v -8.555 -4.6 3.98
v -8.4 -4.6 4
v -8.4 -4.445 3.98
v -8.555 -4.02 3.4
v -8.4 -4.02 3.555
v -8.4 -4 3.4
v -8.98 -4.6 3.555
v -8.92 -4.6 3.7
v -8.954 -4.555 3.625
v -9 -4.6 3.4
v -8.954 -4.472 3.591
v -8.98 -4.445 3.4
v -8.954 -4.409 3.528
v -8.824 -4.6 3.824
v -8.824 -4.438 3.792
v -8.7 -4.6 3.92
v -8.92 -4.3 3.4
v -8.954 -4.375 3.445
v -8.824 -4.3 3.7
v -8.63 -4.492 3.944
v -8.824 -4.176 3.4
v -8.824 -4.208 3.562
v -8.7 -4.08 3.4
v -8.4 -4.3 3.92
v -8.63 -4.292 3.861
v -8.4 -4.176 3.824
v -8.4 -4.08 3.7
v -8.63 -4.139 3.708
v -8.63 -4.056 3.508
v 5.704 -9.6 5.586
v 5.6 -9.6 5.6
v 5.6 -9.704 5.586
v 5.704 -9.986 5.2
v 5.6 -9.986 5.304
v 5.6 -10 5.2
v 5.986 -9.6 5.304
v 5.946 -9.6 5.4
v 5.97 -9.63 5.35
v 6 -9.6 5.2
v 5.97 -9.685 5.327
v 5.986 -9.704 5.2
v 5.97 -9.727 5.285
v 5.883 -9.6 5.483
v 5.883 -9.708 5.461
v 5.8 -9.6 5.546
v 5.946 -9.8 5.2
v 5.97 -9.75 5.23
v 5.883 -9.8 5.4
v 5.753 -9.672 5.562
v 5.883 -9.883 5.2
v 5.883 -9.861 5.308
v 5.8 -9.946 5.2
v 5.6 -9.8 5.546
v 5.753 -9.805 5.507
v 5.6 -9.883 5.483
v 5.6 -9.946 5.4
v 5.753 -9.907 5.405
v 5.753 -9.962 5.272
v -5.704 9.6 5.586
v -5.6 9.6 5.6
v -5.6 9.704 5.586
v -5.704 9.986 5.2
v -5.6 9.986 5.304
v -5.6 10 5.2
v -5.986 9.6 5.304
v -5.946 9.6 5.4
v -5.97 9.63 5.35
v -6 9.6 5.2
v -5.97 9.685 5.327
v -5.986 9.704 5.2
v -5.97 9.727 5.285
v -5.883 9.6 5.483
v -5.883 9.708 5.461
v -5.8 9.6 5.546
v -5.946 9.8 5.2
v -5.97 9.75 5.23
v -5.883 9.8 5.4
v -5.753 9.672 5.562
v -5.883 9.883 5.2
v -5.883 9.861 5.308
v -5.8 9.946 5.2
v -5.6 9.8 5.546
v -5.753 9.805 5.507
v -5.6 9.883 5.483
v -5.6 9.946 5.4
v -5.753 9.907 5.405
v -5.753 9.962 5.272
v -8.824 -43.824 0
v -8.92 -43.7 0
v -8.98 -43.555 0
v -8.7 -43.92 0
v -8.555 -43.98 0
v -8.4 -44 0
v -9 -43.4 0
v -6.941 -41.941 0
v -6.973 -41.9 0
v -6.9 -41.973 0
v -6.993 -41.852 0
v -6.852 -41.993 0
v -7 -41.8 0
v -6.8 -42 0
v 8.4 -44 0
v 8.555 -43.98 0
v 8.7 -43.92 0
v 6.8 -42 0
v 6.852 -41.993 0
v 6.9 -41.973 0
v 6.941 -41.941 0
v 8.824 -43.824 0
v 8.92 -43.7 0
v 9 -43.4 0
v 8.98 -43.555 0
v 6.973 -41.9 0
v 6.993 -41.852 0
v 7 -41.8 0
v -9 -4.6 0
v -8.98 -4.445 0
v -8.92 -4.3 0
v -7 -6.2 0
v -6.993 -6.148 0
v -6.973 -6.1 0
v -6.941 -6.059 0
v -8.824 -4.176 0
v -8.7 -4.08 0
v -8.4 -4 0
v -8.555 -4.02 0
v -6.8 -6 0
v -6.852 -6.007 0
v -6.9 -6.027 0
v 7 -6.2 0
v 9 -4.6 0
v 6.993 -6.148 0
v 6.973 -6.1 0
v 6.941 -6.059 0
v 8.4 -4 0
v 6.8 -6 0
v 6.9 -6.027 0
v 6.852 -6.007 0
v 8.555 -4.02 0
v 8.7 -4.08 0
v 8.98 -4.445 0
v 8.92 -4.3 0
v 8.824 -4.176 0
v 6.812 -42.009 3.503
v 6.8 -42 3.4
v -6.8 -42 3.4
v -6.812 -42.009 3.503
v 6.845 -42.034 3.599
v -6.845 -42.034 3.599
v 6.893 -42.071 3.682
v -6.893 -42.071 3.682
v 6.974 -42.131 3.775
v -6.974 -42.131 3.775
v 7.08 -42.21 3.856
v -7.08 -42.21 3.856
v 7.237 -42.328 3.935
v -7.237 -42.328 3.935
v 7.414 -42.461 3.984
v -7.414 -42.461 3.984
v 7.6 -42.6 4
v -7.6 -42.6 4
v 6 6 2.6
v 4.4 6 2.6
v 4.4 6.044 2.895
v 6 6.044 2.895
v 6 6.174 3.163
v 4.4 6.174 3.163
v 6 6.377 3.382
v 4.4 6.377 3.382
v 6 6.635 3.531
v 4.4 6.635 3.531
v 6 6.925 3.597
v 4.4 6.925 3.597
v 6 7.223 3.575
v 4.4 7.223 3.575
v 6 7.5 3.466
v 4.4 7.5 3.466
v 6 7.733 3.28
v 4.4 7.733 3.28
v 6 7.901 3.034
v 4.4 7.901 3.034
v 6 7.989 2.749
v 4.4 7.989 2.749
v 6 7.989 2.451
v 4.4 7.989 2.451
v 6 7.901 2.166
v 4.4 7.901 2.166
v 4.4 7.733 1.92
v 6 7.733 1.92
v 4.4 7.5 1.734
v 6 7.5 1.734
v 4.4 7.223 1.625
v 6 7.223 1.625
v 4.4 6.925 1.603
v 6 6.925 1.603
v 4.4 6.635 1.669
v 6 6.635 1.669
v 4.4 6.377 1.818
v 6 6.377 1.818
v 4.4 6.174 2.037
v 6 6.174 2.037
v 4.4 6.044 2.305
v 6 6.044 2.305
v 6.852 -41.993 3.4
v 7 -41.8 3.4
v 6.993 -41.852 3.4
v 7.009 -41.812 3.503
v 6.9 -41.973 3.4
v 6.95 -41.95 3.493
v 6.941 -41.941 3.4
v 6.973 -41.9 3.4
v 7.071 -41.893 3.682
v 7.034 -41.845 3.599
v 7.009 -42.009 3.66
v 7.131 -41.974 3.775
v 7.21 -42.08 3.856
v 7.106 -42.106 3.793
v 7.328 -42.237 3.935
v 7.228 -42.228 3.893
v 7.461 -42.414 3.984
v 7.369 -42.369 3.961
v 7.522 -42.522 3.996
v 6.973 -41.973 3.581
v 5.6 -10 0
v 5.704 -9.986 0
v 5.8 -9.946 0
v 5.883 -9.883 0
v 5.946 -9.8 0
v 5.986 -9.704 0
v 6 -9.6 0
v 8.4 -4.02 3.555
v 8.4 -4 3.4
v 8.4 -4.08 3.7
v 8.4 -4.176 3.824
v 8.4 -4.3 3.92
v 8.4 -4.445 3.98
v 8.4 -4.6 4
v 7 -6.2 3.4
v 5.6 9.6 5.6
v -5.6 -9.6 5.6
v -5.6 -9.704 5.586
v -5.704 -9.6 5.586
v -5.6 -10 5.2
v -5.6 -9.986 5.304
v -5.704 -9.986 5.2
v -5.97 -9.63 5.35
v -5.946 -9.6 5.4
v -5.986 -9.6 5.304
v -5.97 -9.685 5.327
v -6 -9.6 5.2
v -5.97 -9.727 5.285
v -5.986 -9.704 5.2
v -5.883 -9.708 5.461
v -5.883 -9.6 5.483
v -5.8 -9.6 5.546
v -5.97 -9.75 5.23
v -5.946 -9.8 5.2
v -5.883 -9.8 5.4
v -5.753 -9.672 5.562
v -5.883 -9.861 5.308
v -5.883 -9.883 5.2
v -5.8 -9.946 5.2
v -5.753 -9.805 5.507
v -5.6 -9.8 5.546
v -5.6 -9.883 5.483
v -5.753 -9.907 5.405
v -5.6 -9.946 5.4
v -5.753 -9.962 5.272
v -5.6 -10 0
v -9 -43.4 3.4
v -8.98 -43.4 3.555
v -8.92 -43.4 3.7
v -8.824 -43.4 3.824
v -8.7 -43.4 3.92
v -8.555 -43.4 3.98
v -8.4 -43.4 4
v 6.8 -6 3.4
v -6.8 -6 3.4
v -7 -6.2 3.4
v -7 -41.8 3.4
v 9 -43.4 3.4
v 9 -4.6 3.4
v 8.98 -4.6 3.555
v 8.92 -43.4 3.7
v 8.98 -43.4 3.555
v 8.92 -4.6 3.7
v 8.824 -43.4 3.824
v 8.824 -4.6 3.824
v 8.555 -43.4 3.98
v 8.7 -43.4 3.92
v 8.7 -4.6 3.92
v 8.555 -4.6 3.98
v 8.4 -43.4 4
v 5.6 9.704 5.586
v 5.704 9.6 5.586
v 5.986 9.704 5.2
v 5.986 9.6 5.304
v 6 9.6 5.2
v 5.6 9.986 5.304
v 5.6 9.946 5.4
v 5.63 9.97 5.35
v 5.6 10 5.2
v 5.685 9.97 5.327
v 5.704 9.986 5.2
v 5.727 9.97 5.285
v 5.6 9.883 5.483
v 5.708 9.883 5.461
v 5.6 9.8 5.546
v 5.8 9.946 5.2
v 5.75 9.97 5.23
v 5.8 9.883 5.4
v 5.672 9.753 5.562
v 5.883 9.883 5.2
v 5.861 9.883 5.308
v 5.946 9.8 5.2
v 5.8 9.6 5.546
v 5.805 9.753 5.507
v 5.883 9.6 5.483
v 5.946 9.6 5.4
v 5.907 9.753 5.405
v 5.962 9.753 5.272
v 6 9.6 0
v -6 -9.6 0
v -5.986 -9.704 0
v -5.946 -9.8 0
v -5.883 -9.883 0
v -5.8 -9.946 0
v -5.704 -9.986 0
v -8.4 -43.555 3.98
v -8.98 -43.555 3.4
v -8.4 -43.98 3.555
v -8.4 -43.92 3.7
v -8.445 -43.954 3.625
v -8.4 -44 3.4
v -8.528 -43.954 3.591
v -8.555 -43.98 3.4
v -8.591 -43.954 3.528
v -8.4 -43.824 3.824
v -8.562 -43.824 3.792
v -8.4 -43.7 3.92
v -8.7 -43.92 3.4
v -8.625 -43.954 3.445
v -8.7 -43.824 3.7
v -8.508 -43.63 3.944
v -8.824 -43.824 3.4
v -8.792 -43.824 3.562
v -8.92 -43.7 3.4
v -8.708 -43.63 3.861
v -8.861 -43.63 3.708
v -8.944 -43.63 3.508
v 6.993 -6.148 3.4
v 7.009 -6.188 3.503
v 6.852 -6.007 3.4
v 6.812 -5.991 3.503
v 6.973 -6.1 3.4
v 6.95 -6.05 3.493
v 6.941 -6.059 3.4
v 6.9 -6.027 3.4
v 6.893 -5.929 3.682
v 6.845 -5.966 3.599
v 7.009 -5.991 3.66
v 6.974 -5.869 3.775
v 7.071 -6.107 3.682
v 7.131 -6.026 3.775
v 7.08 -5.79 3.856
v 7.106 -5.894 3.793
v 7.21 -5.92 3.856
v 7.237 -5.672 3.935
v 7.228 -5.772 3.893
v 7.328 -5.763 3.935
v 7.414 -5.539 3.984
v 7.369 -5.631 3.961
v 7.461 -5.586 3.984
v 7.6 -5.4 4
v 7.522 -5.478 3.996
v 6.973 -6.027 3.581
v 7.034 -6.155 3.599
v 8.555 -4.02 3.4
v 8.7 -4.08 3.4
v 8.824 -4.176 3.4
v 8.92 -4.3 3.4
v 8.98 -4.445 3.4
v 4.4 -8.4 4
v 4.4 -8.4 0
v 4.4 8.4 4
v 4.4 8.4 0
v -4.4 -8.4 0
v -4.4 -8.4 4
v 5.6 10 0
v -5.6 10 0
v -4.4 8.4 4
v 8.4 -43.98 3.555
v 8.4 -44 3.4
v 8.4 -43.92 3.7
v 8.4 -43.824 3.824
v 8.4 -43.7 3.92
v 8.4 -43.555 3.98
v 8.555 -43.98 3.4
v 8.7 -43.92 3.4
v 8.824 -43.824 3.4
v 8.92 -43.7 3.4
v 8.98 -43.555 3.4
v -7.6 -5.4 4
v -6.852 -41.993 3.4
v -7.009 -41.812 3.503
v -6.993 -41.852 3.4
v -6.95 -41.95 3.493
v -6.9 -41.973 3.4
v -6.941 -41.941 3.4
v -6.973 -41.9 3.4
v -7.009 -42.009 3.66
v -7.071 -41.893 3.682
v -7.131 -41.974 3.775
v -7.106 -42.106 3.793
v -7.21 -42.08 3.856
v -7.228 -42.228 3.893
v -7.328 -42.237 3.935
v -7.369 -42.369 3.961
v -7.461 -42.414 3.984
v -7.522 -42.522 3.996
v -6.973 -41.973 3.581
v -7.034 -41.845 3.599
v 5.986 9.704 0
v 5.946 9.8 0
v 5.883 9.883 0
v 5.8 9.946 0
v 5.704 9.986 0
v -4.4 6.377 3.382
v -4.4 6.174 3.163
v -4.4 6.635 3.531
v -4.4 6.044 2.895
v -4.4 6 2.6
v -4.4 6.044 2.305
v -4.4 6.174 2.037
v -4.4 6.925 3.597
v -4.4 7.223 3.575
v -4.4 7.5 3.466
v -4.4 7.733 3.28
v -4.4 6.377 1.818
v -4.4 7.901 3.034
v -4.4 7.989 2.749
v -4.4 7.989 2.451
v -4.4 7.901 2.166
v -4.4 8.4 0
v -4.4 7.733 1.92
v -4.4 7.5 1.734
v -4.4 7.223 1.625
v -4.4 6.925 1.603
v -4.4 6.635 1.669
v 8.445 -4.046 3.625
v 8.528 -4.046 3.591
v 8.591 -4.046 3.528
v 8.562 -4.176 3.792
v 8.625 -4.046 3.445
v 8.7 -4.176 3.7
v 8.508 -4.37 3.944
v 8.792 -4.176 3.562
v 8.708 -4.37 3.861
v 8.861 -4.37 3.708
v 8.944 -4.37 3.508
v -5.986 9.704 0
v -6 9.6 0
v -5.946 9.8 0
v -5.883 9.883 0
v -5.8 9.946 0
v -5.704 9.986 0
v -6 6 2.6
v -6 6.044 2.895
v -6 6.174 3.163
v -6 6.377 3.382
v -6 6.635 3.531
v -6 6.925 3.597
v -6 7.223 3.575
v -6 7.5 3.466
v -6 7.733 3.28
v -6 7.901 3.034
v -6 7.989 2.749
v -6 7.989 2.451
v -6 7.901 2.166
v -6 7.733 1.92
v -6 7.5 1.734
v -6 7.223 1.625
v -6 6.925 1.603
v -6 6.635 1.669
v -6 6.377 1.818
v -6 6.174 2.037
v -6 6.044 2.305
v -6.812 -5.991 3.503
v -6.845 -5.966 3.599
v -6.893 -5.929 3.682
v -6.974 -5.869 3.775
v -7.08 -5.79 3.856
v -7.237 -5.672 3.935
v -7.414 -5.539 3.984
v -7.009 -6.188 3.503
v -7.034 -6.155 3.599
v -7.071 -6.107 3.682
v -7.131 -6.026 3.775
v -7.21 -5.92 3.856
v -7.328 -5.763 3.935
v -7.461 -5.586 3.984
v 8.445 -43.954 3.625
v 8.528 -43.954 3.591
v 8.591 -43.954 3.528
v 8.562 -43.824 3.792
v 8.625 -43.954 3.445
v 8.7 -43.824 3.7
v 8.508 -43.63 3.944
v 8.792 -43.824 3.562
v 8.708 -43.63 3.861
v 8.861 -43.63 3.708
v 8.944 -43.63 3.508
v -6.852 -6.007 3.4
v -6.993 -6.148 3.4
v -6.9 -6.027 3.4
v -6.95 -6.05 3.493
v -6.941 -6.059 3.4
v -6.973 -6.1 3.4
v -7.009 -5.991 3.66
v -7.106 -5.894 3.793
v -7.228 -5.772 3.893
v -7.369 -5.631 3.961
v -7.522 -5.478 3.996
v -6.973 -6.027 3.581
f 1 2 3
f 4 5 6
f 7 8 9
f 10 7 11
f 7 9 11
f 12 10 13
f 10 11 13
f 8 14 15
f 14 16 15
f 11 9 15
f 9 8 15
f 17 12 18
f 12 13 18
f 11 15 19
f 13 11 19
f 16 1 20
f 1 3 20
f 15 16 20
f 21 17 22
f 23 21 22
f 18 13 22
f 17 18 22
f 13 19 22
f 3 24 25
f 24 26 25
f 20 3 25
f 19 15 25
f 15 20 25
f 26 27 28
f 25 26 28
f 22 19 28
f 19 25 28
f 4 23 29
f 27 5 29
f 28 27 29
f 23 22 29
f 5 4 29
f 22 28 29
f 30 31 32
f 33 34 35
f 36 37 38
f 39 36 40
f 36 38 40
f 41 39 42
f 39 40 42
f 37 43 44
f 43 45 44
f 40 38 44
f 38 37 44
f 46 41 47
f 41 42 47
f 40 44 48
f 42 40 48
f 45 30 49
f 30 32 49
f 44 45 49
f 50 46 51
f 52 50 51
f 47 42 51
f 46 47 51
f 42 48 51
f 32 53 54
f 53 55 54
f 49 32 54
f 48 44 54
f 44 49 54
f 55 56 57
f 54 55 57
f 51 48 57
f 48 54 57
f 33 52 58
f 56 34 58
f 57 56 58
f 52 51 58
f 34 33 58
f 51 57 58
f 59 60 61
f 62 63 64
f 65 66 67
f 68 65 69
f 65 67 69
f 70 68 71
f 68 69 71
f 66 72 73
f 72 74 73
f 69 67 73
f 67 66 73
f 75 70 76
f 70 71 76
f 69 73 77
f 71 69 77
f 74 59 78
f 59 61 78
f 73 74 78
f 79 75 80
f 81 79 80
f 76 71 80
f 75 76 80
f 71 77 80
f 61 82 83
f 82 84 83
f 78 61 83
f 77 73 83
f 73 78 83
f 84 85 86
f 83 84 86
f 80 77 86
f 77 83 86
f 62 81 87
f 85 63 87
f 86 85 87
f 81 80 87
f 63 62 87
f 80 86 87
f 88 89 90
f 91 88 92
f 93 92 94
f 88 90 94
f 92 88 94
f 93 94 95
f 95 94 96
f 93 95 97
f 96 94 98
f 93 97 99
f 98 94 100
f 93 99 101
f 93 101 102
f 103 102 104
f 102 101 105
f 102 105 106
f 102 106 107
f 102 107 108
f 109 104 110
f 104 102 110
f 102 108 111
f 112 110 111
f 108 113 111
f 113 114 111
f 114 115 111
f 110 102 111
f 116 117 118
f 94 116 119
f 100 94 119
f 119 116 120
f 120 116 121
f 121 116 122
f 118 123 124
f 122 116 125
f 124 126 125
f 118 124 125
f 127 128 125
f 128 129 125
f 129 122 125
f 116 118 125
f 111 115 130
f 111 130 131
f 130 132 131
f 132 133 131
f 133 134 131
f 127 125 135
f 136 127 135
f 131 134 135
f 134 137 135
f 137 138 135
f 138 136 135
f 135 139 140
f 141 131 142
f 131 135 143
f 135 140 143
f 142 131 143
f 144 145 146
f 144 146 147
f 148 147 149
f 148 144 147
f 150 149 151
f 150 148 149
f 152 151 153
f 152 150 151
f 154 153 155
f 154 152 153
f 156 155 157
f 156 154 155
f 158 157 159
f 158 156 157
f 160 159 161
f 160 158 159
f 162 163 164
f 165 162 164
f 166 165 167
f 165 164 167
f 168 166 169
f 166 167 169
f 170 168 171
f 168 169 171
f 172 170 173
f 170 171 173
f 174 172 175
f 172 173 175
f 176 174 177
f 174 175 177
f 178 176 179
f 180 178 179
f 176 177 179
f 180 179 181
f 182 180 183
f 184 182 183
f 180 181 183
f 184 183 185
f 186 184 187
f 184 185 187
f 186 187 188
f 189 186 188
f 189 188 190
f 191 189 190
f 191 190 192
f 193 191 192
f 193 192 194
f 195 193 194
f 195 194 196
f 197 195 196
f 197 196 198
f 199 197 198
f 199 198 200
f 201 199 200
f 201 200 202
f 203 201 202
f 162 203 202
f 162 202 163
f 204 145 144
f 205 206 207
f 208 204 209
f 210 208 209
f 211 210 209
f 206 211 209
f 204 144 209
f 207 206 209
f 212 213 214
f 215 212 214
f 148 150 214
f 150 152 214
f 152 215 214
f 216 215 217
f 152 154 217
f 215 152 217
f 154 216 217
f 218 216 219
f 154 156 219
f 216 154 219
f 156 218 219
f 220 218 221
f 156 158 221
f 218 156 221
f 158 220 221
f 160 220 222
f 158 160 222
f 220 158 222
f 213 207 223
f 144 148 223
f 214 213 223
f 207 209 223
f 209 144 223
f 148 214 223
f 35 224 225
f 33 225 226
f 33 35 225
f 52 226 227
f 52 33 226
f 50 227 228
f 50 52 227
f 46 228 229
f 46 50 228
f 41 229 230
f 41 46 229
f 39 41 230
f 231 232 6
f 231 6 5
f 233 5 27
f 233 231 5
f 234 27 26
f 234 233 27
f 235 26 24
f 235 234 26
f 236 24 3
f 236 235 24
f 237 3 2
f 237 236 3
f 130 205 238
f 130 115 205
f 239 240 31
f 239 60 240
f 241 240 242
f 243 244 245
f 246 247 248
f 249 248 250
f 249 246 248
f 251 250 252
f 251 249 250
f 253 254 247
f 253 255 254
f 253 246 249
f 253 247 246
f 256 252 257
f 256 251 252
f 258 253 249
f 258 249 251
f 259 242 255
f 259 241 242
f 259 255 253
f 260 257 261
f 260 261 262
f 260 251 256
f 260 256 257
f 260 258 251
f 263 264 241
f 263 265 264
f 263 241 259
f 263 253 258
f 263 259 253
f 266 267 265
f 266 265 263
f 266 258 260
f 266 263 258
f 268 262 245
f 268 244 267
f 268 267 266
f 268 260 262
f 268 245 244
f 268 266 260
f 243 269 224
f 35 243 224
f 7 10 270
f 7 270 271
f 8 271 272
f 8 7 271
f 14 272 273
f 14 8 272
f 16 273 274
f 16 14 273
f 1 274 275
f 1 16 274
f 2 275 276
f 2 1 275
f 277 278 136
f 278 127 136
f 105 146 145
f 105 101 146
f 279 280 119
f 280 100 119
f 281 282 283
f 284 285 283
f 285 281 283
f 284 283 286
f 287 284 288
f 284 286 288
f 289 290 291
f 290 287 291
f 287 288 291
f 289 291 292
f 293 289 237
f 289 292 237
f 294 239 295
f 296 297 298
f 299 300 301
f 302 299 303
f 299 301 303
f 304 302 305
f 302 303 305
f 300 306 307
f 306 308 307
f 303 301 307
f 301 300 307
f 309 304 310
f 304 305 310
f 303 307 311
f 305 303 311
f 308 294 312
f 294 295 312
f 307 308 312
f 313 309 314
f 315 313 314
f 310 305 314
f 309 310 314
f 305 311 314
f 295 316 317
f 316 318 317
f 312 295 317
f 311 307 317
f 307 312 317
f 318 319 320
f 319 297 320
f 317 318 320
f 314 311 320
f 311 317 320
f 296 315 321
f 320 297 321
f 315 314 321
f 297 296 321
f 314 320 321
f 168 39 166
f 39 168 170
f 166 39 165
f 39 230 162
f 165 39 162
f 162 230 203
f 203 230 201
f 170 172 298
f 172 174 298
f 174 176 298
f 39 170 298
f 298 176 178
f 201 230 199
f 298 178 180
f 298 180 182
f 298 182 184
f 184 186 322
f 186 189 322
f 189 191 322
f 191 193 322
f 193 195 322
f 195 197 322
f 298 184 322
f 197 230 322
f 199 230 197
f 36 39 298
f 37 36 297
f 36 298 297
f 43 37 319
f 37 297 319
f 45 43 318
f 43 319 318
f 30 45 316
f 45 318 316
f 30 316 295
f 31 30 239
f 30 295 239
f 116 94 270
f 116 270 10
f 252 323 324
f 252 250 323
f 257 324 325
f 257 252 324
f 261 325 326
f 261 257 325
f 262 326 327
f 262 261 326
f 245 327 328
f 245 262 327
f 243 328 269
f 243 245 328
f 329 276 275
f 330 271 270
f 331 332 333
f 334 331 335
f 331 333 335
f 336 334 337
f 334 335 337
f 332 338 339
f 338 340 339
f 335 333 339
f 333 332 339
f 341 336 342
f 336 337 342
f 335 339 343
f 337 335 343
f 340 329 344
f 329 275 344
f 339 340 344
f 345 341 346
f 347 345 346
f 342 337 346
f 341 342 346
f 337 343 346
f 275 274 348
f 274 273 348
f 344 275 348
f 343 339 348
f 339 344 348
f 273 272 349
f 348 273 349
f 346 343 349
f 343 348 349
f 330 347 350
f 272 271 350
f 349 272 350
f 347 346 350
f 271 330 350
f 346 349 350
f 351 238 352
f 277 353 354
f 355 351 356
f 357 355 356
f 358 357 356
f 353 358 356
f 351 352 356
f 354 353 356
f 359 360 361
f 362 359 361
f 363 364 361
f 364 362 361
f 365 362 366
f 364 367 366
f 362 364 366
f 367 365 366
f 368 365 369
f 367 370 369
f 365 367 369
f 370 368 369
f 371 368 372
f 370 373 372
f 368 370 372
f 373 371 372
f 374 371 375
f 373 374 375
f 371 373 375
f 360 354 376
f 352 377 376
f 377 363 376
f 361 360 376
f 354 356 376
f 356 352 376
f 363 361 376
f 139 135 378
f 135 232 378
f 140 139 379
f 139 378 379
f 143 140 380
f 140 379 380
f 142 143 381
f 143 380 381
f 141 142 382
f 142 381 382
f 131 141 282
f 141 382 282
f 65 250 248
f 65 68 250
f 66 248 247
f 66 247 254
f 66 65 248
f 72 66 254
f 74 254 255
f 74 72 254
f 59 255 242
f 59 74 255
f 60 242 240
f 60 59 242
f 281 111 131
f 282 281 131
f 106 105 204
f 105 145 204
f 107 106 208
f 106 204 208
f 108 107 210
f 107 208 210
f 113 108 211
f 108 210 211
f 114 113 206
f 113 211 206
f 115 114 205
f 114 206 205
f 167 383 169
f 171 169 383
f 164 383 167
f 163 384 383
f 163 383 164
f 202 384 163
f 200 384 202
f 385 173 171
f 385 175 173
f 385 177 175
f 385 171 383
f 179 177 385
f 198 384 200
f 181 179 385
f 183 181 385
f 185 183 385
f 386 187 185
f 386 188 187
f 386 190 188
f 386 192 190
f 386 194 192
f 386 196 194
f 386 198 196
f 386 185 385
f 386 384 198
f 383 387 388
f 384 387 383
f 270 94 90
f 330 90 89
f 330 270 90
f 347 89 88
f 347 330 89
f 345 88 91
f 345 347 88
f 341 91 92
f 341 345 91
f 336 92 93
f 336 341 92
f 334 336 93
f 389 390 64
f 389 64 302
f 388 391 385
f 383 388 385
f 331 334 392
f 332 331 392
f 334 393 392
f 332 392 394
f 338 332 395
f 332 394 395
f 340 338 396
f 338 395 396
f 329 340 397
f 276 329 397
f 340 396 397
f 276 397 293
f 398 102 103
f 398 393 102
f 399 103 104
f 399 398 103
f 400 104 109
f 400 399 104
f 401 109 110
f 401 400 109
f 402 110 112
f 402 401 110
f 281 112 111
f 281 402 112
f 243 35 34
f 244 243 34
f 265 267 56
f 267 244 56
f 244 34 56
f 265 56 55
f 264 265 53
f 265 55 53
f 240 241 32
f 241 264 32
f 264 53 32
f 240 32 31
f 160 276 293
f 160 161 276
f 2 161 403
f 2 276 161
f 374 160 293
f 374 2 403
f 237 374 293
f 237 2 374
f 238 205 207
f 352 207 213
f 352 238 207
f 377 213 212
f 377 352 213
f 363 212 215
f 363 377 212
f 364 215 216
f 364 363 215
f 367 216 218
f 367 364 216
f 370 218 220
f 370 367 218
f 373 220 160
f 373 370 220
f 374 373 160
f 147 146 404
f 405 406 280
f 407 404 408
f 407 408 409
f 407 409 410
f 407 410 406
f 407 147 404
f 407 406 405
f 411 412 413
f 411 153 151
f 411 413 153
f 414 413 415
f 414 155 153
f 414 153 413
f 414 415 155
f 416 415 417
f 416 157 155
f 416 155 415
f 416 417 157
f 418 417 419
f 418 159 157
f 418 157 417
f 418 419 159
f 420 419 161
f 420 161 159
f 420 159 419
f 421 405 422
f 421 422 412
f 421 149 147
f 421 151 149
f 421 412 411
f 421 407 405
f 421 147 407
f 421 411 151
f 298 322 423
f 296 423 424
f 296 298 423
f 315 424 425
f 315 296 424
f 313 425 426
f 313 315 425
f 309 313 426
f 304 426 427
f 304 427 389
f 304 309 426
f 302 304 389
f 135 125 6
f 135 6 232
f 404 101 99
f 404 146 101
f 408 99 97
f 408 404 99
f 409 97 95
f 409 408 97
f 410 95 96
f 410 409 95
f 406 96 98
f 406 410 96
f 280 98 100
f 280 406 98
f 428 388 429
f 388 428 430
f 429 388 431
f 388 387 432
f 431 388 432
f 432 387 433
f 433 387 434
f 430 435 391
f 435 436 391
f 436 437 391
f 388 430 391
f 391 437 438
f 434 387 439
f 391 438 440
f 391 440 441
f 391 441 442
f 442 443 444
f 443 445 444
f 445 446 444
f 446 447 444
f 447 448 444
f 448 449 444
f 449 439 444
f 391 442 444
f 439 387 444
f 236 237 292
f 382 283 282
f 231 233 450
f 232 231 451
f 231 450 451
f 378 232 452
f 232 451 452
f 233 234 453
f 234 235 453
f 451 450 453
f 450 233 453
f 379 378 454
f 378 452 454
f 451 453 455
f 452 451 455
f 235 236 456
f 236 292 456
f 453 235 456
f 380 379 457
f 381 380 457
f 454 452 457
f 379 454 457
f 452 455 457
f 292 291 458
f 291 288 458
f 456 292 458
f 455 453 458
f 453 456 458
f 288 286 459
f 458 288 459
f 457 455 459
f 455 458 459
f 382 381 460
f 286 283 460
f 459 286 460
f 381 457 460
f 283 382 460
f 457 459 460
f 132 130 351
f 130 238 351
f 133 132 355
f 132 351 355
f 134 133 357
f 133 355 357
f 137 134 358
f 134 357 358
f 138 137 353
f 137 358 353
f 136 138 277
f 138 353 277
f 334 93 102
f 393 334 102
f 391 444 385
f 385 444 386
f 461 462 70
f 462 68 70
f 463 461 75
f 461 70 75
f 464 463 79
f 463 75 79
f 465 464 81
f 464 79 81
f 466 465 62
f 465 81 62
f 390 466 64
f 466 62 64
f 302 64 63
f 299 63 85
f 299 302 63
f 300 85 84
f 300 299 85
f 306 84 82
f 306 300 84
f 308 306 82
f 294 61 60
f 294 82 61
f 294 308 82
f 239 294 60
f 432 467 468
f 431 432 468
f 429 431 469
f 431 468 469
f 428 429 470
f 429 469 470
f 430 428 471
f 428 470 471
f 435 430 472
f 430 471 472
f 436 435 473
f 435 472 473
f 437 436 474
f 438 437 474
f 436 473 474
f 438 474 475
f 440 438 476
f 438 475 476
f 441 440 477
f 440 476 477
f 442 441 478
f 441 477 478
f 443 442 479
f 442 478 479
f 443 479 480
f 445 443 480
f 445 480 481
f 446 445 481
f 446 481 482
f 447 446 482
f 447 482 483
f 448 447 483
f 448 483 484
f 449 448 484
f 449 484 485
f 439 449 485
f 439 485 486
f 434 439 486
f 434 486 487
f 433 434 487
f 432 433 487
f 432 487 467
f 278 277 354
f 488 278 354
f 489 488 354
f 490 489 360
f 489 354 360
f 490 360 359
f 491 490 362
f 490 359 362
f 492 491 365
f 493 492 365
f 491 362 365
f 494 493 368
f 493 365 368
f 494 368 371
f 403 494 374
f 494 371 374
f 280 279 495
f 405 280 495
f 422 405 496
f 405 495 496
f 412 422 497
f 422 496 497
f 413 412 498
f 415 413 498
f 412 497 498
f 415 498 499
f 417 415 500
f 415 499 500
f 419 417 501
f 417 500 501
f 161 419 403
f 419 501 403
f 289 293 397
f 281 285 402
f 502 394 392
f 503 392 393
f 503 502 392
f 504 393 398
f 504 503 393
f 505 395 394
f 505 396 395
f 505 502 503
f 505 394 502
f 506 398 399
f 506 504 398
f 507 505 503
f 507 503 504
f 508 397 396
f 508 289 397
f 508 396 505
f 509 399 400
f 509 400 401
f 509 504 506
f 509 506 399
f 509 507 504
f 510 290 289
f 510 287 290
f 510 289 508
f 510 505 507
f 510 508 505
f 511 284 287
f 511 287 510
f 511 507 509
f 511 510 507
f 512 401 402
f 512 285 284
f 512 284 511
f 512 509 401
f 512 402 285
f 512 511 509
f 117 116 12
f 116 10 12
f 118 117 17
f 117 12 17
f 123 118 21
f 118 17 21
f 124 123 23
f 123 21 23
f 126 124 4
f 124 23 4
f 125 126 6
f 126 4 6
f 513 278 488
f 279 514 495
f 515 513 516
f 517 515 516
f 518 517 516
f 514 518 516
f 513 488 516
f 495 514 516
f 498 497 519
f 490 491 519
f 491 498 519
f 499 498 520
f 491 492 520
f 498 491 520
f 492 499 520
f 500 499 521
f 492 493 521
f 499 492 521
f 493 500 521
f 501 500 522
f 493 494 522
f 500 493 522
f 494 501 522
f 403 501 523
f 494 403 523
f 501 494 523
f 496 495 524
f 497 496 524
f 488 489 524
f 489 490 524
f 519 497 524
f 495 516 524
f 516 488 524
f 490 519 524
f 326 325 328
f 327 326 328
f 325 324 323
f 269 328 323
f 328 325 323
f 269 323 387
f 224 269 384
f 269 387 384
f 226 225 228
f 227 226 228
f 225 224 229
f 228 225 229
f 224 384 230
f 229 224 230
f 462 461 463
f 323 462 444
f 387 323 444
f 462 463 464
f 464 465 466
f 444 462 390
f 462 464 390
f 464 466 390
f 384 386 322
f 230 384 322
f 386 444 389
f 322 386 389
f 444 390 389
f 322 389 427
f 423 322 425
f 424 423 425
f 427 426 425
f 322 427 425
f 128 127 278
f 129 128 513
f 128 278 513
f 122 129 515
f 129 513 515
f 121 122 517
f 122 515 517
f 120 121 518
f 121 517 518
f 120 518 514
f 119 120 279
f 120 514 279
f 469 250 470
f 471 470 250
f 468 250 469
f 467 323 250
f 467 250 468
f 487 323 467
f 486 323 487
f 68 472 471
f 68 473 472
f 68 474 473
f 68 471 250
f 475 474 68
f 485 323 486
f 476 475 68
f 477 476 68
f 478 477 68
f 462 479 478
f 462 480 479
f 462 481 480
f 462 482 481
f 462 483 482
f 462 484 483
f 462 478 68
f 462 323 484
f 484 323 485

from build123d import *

# Parameters (mm, degrees)
F0_W     = 12
F0_H     = 20
F1_DEPTH = 5.6
F2_T     = -1.6
F3_W     = 18
F3_H     = 40
F3_W_2   = 14
F3_H_2   = 36
F4_DEPTH = 4
F5_R     = 0.4
F6_R     = 0.6
F7_R     = 0.2
F8_R     = 1
F9_DEPTH = 25


with BuildPart() as f1:
    # F0 (on Top) → F1 (new body)
    with BuildSketch(Plane.XY):
        Rectangle(F0_W, F0_H)
    extrude(amount=F1_DEPTH)

    # F2
    f2_openings = [f1.faces().sort_by_distance(p)[0] for p in [
        (0, 0, 0),
    ]]
    offset(amount=F2_T, openings=f2_openings)

    # F5
    f5_edges = [f1.edges().sort_by_distance(p)[0] for p in [
        (0, -10, 5.6),
        (6, 0, 5.6),
        (0, 10, 5.6),
        (-6, 0, 5.6),
        (-6, 10, 2.8),
        (-6, -10, 2.8),
        (6, -10, 2.8),
        (6, 10, 2.8),
    ]]
    fillet(f5_edges, radius=F5_R)

    # F8 (on face) → F9 (cut)
    with BuildSketch(Plane(origin=(-6, 0, 0), x_dir=(0, -1, 0), z_dir=(-1, 0, 0))):
        with Locations((-7, 2.6)):
            Circle(F8_R)
    extrude(amount=-F9_DEPTH, mode=Mode.SUBTRACT)


with BuildPart() as f4:
    # F3 (on Top) → F4 (new body)
    with BuildSketch(Plane.XY):
        with Locations((0, -24)):
            Rectangle(F3_W, F3_H)
        with Locations((0, -24)):
            Rectangle(F3_W_2, F3_H_2, mode=Mode.SUBTRACT)
    extrude(amount=F4_DEPTH)

    # F6
    f6_edges = [f4.edges().sort_by_distance(p)[0] for p in [
        (9, -24, 4),
        (0, -4, 4),
        (-9, -24, 4),
        (0, -44, 4),
        (0, -6, 4),
        (7, -24, 4),
        (0, -42, 4),
        (-7, -24, 4),
        (-9, -4, 2),
        (9, -4, 2),
        (9, -44, 2),
        (-9, -44, 2),
    ]]
    fillet(f6_edges, radius=F6_R)

    # F7
    f7_edges = [f4.edges().sort_by_distance(p)[0] for p in [
        (-7, -6, 1.7),
        (7, -6, 1.7),
        (-7, -42, 1.7),
        (7, -42, 1.7),
    ]]
    fillet(f7_edges, radius=F7_R)


solid = Compound([f1.part, f4.part])
